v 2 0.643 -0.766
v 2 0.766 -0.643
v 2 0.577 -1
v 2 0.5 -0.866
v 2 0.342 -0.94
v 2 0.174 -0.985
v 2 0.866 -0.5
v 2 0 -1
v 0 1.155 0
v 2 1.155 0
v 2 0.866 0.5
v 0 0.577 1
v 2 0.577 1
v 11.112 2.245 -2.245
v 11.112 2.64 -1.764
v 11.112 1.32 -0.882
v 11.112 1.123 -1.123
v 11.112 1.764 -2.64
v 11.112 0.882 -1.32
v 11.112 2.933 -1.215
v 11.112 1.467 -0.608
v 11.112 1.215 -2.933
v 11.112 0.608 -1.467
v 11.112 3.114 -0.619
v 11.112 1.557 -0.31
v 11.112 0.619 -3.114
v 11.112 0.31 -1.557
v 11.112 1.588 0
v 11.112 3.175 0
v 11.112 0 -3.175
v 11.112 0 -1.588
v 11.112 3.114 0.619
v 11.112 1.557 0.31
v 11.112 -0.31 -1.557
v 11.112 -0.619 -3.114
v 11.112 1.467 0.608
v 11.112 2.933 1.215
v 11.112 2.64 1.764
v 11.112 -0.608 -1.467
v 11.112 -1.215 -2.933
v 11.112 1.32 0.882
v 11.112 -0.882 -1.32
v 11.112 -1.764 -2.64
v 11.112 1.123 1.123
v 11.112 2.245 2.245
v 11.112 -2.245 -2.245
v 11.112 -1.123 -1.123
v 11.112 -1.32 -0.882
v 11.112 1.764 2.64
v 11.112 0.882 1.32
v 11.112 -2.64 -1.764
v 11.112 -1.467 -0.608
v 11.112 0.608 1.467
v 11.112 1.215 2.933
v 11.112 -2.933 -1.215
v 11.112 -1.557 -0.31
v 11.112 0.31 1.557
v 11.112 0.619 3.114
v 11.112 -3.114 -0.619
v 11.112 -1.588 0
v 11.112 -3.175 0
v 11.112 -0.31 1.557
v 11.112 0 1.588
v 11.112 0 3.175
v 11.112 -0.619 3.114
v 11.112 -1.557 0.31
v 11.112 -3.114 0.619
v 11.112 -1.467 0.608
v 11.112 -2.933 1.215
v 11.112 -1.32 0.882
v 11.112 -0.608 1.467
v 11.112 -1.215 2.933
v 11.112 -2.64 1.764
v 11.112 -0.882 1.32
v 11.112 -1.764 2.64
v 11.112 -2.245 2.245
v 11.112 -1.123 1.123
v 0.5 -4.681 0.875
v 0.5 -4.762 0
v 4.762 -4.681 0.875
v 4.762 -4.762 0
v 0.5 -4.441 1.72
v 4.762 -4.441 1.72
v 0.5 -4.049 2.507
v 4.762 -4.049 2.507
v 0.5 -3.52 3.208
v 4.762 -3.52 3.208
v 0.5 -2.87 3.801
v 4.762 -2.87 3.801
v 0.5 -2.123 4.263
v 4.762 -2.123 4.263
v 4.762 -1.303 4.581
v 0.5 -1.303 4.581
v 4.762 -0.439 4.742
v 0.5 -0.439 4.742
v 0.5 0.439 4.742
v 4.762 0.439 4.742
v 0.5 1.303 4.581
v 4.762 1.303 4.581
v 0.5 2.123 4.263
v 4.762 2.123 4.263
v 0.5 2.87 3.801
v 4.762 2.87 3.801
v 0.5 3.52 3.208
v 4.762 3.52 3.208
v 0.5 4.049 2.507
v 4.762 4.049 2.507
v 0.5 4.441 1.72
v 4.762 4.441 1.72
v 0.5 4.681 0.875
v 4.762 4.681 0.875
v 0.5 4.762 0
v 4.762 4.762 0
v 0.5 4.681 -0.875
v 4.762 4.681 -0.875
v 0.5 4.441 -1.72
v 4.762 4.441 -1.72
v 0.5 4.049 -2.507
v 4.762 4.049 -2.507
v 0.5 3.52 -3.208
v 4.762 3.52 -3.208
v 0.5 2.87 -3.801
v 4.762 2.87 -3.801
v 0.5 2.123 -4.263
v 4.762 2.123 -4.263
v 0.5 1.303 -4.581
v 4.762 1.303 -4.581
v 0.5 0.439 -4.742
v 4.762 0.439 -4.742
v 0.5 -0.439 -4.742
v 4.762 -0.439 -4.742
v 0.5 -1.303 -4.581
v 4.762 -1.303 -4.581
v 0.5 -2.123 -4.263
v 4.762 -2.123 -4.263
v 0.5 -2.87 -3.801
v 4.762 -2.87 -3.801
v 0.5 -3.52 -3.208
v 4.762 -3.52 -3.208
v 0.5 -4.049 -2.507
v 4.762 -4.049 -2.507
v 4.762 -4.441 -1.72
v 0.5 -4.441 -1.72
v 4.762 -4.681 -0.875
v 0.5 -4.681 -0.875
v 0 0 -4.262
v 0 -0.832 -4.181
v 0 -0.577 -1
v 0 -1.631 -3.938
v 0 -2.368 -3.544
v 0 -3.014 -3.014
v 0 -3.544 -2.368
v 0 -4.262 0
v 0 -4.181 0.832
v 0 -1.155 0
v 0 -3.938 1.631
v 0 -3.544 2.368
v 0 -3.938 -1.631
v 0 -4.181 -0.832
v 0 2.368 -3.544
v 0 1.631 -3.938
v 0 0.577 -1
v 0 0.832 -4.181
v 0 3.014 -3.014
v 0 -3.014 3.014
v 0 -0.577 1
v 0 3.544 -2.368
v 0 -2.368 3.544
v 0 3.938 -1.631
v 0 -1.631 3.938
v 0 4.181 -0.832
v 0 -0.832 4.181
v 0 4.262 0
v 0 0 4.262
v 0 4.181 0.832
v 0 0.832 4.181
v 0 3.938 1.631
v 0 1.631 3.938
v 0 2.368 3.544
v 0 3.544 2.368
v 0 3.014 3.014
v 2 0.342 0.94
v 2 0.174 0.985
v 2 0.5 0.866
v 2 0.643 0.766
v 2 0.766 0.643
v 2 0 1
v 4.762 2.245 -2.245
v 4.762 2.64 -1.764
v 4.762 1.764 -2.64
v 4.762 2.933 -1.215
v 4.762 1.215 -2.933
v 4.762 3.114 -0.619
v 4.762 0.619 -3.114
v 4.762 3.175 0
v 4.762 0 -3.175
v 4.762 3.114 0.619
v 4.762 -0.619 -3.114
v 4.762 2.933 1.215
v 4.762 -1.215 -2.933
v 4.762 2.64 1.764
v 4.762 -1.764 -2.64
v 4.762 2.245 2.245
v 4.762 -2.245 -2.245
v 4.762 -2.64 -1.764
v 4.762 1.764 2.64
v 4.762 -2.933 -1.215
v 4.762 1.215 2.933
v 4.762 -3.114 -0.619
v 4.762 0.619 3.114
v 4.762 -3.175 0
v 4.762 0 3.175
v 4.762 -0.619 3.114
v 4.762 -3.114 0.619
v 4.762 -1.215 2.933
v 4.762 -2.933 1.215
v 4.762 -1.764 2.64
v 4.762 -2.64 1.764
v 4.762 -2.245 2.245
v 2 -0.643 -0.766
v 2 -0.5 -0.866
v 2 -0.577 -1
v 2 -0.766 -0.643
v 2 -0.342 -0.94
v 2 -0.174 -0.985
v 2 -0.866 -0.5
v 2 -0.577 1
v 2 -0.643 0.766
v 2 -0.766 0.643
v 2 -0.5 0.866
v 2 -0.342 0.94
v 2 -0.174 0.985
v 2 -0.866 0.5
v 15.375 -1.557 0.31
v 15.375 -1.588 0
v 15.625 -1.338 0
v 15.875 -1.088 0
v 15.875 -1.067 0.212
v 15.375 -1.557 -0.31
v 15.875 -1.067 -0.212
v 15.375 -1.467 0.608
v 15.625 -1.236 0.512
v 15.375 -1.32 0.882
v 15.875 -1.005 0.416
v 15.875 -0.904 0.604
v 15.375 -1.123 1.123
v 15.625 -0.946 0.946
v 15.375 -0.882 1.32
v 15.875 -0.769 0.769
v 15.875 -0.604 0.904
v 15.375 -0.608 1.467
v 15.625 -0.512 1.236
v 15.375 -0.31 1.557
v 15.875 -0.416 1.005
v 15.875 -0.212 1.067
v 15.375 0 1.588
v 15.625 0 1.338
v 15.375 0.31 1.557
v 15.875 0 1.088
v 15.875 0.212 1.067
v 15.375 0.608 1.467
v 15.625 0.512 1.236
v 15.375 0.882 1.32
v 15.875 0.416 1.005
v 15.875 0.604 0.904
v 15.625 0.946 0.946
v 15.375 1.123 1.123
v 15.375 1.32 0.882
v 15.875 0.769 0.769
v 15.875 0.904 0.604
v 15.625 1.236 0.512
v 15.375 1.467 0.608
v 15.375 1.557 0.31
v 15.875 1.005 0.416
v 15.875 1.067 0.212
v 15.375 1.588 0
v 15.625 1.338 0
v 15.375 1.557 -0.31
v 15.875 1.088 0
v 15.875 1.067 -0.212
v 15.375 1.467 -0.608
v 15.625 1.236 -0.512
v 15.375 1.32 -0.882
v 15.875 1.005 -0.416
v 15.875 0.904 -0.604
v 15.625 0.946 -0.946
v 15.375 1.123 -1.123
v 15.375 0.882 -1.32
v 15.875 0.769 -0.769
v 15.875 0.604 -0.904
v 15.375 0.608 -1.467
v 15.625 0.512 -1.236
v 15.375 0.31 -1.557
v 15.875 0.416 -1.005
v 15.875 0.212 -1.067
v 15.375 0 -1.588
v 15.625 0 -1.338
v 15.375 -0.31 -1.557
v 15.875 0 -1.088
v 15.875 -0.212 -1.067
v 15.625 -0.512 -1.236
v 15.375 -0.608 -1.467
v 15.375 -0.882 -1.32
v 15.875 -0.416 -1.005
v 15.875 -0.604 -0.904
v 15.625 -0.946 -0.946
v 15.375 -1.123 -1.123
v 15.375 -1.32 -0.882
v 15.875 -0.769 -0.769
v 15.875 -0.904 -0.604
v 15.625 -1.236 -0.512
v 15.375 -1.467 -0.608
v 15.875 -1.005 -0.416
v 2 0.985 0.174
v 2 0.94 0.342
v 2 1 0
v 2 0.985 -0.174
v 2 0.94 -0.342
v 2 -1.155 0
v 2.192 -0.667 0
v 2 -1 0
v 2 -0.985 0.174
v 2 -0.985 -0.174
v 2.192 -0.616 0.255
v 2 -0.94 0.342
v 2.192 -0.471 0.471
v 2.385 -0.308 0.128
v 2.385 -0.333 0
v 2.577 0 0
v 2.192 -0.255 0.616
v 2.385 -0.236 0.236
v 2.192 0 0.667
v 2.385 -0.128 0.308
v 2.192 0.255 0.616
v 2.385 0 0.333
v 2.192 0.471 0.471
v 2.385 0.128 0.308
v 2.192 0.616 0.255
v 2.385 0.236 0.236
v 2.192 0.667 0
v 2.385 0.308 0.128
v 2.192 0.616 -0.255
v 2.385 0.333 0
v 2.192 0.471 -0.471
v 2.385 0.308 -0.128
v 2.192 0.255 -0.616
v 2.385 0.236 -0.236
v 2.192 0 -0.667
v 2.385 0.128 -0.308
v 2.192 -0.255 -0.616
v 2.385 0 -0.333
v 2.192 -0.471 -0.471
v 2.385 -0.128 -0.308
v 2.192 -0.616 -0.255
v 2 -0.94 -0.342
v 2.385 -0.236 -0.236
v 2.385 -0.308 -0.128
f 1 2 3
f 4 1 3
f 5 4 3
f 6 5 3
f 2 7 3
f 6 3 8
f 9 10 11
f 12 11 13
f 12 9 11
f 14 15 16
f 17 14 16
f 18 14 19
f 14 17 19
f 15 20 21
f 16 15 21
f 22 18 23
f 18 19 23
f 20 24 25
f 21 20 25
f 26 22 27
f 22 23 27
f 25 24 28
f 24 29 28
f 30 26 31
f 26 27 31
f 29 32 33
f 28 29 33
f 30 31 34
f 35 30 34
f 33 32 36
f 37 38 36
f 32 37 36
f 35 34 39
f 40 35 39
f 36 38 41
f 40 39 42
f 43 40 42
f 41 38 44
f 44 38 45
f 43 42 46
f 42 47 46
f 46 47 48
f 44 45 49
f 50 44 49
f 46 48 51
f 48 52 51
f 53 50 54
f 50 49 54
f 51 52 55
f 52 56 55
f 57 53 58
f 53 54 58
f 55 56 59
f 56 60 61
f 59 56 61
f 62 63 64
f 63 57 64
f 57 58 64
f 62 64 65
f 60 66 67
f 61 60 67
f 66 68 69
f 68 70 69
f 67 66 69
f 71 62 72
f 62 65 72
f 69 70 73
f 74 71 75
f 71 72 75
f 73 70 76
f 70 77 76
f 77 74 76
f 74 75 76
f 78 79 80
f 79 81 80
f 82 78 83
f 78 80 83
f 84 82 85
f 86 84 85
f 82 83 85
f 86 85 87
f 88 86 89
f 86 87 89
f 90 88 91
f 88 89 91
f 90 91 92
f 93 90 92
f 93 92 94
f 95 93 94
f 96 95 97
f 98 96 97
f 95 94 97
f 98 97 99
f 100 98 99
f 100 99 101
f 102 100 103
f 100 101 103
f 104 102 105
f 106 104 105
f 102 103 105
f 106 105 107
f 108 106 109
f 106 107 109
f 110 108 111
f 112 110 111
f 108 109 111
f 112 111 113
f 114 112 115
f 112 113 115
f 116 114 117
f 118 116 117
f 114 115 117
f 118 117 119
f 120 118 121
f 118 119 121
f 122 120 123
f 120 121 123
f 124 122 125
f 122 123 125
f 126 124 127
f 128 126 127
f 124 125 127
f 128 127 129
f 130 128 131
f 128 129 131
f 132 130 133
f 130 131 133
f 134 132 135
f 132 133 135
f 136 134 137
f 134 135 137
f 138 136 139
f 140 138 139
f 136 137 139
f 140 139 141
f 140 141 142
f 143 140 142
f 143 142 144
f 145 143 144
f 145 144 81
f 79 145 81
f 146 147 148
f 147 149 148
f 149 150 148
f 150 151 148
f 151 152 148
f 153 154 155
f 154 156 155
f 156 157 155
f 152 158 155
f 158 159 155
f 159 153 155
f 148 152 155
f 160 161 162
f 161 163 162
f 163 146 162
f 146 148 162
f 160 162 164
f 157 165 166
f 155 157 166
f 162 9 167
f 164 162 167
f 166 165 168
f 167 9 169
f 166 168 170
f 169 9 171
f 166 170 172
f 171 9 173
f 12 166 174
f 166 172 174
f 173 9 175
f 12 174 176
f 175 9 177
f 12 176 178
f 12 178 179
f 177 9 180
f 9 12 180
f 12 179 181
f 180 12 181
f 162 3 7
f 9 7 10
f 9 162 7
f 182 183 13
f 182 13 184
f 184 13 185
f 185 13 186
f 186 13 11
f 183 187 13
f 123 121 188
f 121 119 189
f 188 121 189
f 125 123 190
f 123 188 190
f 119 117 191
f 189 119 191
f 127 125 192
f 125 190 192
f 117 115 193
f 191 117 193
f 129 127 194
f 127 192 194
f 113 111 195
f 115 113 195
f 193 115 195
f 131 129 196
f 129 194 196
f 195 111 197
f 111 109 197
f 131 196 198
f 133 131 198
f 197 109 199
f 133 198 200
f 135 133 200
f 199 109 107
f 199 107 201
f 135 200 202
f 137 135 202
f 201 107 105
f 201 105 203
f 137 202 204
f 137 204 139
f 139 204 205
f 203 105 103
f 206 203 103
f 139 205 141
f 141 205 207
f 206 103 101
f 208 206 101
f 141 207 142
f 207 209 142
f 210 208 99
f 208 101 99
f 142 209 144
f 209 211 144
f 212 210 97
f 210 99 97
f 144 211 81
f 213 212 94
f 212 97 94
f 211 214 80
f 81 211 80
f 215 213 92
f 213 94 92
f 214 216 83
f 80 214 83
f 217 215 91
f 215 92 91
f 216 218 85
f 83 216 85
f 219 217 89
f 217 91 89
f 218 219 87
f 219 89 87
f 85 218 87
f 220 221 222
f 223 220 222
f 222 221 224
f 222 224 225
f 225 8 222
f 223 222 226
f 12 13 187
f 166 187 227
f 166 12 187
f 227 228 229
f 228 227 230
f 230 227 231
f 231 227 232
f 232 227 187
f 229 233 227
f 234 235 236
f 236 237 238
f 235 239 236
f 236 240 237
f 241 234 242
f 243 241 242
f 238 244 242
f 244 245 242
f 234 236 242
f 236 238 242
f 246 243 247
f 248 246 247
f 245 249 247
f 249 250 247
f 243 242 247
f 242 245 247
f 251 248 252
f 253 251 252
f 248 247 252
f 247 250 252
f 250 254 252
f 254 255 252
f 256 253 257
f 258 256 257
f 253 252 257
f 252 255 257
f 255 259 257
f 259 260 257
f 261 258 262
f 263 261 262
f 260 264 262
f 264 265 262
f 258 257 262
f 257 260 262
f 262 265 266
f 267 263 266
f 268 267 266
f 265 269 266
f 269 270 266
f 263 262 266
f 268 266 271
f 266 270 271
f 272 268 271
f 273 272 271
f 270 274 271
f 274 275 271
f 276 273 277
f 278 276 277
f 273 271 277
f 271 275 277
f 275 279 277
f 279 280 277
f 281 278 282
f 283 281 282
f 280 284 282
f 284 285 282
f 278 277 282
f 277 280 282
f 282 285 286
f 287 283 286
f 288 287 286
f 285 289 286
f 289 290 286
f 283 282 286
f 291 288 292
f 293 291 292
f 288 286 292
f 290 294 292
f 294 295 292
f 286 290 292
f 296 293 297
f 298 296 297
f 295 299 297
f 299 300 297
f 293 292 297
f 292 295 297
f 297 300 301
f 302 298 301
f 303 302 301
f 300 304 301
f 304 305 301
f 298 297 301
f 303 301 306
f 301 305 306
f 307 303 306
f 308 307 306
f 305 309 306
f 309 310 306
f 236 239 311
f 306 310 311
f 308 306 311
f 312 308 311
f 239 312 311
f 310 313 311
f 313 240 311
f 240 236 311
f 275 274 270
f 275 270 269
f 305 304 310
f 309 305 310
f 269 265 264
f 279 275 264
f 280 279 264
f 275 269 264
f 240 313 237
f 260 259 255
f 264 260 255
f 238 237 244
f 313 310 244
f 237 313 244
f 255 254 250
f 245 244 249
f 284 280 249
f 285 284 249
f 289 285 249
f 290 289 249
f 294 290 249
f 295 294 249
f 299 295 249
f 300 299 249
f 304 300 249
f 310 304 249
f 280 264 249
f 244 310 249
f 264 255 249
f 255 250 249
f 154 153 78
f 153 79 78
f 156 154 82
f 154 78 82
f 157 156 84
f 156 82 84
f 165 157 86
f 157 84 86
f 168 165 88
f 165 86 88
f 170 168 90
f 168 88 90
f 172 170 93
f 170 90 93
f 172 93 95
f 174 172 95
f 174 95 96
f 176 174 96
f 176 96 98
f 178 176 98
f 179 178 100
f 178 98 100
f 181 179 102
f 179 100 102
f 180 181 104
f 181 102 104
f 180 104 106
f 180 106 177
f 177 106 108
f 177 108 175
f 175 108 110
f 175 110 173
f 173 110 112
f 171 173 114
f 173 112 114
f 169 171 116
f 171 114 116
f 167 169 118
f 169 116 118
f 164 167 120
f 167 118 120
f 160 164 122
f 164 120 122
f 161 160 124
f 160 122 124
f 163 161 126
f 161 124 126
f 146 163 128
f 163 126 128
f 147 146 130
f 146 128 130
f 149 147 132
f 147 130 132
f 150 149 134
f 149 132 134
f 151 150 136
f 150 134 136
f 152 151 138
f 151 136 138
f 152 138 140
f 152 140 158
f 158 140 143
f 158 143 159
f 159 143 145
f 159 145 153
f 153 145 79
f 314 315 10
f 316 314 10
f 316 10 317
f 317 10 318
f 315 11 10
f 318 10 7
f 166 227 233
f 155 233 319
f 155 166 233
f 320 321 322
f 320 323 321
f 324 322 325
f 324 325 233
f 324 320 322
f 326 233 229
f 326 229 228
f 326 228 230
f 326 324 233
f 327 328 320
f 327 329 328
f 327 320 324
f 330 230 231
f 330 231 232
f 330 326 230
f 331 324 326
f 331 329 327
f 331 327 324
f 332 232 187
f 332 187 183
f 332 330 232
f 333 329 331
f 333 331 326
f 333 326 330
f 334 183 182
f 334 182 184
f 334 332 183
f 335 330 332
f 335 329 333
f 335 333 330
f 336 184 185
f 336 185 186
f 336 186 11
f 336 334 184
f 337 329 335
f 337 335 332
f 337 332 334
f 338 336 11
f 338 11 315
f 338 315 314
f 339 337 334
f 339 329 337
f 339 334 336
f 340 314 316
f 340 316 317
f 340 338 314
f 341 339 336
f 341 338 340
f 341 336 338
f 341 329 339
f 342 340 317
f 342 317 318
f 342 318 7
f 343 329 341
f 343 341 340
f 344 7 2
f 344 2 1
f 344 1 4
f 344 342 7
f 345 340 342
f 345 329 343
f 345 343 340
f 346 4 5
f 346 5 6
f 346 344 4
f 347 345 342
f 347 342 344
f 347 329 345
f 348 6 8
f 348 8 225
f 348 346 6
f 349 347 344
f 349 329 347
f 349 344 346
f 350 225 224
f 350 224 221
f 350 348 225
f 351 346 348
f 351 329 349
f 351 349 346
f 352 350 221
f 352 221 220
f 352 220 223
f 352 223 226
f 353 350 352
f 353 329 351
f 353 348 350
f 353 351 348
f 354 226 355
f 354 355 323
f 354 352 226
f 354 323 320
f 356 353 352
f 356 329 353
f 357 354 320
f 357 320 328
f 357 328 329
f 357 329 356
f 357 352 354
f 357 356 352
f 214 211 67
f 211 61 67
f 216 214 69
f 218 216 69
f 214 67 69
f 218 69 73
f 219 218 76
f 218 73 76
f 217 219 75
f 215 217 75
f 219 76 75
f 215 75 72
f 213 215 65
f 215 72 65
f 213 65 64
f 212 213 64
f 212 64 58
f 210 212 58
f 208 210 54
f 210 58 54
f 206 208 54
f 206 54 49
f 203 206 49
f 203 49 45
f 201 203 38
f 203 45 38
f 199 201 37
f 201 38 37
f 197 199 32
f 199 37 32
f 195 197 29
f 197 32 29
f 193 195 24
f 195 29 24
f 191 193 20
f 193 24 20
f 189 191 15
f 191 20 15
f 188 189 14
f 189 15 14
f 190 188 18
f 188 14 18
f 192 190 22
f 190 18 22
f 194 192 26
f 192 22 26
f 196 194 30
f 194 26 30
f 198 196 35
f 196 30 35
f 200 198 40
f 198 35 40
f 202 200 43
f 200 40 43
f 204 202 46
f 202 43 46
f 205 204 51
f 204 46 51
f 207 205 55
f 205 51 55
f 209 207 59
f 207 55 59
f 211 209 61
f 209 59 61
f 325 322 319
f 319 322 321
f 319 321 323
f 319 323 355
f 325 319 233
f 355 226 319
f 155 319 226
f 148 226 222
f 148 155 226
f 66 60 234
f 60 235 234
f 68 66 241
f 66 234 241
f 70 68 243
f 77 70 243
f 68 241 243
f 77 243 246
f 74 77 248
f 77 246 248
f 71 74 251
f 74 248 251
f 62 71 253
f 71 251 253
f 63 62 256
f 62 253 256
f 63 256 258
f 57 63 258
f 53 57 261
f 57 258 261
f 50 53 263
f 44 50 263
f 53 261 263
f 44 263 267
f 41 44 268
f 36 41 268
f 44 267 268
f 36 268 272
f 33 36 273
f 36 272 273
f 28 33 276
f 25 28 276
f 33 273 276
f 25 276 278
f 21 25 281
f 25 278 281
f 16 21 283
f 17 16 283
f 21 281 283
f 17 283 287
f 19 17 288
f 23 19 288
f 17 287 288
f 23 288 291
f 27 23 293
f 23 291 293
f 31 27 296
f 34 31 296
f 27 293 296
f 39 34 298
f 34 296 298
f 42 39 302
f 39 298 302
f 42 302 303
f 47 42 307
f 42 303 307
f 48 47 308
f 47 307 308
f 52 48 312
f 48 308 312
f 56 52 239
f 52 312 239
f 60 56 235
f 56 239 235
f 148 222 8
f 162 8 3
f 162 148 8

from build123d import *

# Parameters (mm, degrees)
CUT_EXTRUDE1_DEPTH = 2


with BuildPart() as part:
    # Sketch1 → Revolve1 (revolve)
    with BuildSketch(Plane.XY, mode=Mode.PRIVATE) as revolve1_sk:
        Polygon((0, 0), (0, 4.2625), (0.5, 4.7625), (4.7625, 4.7625), (4.7625, 3.175), (11.1125, 3.175), (11.1125, 1.5875), (15.375, 1.5875), (15.875, 1.0875), (15.875, 0), align=None)
    revolve(revolve1_sk.sketch.rotate(Axis((15.875, 0, 0), (-1, 0, 0)), 180), axis=Axis((15.875, 0, 0), (-1, 0, 0)))

    # Sketch2 → Cut-Revolve1 (revolve, cut)
    with BuildSketch(Plane.XY, mode=Mode.PRIVATE) as cut_revolve1_sk:
        Polygon((0, 0), (0, 1), (2, 1), (2.577350269, 0), align=None)
    revolve(cut_revolve1_sk.sketch.rotate(Axis((2.577350269, 0, 0), (-1, 0, 0)), 180), axis=Axis((2.577350269, 0, 0), (-1, 0, 0)), mode=Mode.SUBTRACT)

    # Sketch3 → Cut-Extrude1 (cut)
    with BuildSketch(Plane(origin=(0, 0, 0), x_dir=(0, 0, -1), z_dir=(1, 0, 0))):
        Polygon((-1, 0.577350269), (-1, -0.577350269), (0, -1.154700538), (1, -0.577350269), (1, 0.577350269), (0, 1.154700538), align=None)
    extrude(amount=CUT_EXTRUDE1_DEPTH, mode=Mode.SUBTRACT)


solid = part.part
